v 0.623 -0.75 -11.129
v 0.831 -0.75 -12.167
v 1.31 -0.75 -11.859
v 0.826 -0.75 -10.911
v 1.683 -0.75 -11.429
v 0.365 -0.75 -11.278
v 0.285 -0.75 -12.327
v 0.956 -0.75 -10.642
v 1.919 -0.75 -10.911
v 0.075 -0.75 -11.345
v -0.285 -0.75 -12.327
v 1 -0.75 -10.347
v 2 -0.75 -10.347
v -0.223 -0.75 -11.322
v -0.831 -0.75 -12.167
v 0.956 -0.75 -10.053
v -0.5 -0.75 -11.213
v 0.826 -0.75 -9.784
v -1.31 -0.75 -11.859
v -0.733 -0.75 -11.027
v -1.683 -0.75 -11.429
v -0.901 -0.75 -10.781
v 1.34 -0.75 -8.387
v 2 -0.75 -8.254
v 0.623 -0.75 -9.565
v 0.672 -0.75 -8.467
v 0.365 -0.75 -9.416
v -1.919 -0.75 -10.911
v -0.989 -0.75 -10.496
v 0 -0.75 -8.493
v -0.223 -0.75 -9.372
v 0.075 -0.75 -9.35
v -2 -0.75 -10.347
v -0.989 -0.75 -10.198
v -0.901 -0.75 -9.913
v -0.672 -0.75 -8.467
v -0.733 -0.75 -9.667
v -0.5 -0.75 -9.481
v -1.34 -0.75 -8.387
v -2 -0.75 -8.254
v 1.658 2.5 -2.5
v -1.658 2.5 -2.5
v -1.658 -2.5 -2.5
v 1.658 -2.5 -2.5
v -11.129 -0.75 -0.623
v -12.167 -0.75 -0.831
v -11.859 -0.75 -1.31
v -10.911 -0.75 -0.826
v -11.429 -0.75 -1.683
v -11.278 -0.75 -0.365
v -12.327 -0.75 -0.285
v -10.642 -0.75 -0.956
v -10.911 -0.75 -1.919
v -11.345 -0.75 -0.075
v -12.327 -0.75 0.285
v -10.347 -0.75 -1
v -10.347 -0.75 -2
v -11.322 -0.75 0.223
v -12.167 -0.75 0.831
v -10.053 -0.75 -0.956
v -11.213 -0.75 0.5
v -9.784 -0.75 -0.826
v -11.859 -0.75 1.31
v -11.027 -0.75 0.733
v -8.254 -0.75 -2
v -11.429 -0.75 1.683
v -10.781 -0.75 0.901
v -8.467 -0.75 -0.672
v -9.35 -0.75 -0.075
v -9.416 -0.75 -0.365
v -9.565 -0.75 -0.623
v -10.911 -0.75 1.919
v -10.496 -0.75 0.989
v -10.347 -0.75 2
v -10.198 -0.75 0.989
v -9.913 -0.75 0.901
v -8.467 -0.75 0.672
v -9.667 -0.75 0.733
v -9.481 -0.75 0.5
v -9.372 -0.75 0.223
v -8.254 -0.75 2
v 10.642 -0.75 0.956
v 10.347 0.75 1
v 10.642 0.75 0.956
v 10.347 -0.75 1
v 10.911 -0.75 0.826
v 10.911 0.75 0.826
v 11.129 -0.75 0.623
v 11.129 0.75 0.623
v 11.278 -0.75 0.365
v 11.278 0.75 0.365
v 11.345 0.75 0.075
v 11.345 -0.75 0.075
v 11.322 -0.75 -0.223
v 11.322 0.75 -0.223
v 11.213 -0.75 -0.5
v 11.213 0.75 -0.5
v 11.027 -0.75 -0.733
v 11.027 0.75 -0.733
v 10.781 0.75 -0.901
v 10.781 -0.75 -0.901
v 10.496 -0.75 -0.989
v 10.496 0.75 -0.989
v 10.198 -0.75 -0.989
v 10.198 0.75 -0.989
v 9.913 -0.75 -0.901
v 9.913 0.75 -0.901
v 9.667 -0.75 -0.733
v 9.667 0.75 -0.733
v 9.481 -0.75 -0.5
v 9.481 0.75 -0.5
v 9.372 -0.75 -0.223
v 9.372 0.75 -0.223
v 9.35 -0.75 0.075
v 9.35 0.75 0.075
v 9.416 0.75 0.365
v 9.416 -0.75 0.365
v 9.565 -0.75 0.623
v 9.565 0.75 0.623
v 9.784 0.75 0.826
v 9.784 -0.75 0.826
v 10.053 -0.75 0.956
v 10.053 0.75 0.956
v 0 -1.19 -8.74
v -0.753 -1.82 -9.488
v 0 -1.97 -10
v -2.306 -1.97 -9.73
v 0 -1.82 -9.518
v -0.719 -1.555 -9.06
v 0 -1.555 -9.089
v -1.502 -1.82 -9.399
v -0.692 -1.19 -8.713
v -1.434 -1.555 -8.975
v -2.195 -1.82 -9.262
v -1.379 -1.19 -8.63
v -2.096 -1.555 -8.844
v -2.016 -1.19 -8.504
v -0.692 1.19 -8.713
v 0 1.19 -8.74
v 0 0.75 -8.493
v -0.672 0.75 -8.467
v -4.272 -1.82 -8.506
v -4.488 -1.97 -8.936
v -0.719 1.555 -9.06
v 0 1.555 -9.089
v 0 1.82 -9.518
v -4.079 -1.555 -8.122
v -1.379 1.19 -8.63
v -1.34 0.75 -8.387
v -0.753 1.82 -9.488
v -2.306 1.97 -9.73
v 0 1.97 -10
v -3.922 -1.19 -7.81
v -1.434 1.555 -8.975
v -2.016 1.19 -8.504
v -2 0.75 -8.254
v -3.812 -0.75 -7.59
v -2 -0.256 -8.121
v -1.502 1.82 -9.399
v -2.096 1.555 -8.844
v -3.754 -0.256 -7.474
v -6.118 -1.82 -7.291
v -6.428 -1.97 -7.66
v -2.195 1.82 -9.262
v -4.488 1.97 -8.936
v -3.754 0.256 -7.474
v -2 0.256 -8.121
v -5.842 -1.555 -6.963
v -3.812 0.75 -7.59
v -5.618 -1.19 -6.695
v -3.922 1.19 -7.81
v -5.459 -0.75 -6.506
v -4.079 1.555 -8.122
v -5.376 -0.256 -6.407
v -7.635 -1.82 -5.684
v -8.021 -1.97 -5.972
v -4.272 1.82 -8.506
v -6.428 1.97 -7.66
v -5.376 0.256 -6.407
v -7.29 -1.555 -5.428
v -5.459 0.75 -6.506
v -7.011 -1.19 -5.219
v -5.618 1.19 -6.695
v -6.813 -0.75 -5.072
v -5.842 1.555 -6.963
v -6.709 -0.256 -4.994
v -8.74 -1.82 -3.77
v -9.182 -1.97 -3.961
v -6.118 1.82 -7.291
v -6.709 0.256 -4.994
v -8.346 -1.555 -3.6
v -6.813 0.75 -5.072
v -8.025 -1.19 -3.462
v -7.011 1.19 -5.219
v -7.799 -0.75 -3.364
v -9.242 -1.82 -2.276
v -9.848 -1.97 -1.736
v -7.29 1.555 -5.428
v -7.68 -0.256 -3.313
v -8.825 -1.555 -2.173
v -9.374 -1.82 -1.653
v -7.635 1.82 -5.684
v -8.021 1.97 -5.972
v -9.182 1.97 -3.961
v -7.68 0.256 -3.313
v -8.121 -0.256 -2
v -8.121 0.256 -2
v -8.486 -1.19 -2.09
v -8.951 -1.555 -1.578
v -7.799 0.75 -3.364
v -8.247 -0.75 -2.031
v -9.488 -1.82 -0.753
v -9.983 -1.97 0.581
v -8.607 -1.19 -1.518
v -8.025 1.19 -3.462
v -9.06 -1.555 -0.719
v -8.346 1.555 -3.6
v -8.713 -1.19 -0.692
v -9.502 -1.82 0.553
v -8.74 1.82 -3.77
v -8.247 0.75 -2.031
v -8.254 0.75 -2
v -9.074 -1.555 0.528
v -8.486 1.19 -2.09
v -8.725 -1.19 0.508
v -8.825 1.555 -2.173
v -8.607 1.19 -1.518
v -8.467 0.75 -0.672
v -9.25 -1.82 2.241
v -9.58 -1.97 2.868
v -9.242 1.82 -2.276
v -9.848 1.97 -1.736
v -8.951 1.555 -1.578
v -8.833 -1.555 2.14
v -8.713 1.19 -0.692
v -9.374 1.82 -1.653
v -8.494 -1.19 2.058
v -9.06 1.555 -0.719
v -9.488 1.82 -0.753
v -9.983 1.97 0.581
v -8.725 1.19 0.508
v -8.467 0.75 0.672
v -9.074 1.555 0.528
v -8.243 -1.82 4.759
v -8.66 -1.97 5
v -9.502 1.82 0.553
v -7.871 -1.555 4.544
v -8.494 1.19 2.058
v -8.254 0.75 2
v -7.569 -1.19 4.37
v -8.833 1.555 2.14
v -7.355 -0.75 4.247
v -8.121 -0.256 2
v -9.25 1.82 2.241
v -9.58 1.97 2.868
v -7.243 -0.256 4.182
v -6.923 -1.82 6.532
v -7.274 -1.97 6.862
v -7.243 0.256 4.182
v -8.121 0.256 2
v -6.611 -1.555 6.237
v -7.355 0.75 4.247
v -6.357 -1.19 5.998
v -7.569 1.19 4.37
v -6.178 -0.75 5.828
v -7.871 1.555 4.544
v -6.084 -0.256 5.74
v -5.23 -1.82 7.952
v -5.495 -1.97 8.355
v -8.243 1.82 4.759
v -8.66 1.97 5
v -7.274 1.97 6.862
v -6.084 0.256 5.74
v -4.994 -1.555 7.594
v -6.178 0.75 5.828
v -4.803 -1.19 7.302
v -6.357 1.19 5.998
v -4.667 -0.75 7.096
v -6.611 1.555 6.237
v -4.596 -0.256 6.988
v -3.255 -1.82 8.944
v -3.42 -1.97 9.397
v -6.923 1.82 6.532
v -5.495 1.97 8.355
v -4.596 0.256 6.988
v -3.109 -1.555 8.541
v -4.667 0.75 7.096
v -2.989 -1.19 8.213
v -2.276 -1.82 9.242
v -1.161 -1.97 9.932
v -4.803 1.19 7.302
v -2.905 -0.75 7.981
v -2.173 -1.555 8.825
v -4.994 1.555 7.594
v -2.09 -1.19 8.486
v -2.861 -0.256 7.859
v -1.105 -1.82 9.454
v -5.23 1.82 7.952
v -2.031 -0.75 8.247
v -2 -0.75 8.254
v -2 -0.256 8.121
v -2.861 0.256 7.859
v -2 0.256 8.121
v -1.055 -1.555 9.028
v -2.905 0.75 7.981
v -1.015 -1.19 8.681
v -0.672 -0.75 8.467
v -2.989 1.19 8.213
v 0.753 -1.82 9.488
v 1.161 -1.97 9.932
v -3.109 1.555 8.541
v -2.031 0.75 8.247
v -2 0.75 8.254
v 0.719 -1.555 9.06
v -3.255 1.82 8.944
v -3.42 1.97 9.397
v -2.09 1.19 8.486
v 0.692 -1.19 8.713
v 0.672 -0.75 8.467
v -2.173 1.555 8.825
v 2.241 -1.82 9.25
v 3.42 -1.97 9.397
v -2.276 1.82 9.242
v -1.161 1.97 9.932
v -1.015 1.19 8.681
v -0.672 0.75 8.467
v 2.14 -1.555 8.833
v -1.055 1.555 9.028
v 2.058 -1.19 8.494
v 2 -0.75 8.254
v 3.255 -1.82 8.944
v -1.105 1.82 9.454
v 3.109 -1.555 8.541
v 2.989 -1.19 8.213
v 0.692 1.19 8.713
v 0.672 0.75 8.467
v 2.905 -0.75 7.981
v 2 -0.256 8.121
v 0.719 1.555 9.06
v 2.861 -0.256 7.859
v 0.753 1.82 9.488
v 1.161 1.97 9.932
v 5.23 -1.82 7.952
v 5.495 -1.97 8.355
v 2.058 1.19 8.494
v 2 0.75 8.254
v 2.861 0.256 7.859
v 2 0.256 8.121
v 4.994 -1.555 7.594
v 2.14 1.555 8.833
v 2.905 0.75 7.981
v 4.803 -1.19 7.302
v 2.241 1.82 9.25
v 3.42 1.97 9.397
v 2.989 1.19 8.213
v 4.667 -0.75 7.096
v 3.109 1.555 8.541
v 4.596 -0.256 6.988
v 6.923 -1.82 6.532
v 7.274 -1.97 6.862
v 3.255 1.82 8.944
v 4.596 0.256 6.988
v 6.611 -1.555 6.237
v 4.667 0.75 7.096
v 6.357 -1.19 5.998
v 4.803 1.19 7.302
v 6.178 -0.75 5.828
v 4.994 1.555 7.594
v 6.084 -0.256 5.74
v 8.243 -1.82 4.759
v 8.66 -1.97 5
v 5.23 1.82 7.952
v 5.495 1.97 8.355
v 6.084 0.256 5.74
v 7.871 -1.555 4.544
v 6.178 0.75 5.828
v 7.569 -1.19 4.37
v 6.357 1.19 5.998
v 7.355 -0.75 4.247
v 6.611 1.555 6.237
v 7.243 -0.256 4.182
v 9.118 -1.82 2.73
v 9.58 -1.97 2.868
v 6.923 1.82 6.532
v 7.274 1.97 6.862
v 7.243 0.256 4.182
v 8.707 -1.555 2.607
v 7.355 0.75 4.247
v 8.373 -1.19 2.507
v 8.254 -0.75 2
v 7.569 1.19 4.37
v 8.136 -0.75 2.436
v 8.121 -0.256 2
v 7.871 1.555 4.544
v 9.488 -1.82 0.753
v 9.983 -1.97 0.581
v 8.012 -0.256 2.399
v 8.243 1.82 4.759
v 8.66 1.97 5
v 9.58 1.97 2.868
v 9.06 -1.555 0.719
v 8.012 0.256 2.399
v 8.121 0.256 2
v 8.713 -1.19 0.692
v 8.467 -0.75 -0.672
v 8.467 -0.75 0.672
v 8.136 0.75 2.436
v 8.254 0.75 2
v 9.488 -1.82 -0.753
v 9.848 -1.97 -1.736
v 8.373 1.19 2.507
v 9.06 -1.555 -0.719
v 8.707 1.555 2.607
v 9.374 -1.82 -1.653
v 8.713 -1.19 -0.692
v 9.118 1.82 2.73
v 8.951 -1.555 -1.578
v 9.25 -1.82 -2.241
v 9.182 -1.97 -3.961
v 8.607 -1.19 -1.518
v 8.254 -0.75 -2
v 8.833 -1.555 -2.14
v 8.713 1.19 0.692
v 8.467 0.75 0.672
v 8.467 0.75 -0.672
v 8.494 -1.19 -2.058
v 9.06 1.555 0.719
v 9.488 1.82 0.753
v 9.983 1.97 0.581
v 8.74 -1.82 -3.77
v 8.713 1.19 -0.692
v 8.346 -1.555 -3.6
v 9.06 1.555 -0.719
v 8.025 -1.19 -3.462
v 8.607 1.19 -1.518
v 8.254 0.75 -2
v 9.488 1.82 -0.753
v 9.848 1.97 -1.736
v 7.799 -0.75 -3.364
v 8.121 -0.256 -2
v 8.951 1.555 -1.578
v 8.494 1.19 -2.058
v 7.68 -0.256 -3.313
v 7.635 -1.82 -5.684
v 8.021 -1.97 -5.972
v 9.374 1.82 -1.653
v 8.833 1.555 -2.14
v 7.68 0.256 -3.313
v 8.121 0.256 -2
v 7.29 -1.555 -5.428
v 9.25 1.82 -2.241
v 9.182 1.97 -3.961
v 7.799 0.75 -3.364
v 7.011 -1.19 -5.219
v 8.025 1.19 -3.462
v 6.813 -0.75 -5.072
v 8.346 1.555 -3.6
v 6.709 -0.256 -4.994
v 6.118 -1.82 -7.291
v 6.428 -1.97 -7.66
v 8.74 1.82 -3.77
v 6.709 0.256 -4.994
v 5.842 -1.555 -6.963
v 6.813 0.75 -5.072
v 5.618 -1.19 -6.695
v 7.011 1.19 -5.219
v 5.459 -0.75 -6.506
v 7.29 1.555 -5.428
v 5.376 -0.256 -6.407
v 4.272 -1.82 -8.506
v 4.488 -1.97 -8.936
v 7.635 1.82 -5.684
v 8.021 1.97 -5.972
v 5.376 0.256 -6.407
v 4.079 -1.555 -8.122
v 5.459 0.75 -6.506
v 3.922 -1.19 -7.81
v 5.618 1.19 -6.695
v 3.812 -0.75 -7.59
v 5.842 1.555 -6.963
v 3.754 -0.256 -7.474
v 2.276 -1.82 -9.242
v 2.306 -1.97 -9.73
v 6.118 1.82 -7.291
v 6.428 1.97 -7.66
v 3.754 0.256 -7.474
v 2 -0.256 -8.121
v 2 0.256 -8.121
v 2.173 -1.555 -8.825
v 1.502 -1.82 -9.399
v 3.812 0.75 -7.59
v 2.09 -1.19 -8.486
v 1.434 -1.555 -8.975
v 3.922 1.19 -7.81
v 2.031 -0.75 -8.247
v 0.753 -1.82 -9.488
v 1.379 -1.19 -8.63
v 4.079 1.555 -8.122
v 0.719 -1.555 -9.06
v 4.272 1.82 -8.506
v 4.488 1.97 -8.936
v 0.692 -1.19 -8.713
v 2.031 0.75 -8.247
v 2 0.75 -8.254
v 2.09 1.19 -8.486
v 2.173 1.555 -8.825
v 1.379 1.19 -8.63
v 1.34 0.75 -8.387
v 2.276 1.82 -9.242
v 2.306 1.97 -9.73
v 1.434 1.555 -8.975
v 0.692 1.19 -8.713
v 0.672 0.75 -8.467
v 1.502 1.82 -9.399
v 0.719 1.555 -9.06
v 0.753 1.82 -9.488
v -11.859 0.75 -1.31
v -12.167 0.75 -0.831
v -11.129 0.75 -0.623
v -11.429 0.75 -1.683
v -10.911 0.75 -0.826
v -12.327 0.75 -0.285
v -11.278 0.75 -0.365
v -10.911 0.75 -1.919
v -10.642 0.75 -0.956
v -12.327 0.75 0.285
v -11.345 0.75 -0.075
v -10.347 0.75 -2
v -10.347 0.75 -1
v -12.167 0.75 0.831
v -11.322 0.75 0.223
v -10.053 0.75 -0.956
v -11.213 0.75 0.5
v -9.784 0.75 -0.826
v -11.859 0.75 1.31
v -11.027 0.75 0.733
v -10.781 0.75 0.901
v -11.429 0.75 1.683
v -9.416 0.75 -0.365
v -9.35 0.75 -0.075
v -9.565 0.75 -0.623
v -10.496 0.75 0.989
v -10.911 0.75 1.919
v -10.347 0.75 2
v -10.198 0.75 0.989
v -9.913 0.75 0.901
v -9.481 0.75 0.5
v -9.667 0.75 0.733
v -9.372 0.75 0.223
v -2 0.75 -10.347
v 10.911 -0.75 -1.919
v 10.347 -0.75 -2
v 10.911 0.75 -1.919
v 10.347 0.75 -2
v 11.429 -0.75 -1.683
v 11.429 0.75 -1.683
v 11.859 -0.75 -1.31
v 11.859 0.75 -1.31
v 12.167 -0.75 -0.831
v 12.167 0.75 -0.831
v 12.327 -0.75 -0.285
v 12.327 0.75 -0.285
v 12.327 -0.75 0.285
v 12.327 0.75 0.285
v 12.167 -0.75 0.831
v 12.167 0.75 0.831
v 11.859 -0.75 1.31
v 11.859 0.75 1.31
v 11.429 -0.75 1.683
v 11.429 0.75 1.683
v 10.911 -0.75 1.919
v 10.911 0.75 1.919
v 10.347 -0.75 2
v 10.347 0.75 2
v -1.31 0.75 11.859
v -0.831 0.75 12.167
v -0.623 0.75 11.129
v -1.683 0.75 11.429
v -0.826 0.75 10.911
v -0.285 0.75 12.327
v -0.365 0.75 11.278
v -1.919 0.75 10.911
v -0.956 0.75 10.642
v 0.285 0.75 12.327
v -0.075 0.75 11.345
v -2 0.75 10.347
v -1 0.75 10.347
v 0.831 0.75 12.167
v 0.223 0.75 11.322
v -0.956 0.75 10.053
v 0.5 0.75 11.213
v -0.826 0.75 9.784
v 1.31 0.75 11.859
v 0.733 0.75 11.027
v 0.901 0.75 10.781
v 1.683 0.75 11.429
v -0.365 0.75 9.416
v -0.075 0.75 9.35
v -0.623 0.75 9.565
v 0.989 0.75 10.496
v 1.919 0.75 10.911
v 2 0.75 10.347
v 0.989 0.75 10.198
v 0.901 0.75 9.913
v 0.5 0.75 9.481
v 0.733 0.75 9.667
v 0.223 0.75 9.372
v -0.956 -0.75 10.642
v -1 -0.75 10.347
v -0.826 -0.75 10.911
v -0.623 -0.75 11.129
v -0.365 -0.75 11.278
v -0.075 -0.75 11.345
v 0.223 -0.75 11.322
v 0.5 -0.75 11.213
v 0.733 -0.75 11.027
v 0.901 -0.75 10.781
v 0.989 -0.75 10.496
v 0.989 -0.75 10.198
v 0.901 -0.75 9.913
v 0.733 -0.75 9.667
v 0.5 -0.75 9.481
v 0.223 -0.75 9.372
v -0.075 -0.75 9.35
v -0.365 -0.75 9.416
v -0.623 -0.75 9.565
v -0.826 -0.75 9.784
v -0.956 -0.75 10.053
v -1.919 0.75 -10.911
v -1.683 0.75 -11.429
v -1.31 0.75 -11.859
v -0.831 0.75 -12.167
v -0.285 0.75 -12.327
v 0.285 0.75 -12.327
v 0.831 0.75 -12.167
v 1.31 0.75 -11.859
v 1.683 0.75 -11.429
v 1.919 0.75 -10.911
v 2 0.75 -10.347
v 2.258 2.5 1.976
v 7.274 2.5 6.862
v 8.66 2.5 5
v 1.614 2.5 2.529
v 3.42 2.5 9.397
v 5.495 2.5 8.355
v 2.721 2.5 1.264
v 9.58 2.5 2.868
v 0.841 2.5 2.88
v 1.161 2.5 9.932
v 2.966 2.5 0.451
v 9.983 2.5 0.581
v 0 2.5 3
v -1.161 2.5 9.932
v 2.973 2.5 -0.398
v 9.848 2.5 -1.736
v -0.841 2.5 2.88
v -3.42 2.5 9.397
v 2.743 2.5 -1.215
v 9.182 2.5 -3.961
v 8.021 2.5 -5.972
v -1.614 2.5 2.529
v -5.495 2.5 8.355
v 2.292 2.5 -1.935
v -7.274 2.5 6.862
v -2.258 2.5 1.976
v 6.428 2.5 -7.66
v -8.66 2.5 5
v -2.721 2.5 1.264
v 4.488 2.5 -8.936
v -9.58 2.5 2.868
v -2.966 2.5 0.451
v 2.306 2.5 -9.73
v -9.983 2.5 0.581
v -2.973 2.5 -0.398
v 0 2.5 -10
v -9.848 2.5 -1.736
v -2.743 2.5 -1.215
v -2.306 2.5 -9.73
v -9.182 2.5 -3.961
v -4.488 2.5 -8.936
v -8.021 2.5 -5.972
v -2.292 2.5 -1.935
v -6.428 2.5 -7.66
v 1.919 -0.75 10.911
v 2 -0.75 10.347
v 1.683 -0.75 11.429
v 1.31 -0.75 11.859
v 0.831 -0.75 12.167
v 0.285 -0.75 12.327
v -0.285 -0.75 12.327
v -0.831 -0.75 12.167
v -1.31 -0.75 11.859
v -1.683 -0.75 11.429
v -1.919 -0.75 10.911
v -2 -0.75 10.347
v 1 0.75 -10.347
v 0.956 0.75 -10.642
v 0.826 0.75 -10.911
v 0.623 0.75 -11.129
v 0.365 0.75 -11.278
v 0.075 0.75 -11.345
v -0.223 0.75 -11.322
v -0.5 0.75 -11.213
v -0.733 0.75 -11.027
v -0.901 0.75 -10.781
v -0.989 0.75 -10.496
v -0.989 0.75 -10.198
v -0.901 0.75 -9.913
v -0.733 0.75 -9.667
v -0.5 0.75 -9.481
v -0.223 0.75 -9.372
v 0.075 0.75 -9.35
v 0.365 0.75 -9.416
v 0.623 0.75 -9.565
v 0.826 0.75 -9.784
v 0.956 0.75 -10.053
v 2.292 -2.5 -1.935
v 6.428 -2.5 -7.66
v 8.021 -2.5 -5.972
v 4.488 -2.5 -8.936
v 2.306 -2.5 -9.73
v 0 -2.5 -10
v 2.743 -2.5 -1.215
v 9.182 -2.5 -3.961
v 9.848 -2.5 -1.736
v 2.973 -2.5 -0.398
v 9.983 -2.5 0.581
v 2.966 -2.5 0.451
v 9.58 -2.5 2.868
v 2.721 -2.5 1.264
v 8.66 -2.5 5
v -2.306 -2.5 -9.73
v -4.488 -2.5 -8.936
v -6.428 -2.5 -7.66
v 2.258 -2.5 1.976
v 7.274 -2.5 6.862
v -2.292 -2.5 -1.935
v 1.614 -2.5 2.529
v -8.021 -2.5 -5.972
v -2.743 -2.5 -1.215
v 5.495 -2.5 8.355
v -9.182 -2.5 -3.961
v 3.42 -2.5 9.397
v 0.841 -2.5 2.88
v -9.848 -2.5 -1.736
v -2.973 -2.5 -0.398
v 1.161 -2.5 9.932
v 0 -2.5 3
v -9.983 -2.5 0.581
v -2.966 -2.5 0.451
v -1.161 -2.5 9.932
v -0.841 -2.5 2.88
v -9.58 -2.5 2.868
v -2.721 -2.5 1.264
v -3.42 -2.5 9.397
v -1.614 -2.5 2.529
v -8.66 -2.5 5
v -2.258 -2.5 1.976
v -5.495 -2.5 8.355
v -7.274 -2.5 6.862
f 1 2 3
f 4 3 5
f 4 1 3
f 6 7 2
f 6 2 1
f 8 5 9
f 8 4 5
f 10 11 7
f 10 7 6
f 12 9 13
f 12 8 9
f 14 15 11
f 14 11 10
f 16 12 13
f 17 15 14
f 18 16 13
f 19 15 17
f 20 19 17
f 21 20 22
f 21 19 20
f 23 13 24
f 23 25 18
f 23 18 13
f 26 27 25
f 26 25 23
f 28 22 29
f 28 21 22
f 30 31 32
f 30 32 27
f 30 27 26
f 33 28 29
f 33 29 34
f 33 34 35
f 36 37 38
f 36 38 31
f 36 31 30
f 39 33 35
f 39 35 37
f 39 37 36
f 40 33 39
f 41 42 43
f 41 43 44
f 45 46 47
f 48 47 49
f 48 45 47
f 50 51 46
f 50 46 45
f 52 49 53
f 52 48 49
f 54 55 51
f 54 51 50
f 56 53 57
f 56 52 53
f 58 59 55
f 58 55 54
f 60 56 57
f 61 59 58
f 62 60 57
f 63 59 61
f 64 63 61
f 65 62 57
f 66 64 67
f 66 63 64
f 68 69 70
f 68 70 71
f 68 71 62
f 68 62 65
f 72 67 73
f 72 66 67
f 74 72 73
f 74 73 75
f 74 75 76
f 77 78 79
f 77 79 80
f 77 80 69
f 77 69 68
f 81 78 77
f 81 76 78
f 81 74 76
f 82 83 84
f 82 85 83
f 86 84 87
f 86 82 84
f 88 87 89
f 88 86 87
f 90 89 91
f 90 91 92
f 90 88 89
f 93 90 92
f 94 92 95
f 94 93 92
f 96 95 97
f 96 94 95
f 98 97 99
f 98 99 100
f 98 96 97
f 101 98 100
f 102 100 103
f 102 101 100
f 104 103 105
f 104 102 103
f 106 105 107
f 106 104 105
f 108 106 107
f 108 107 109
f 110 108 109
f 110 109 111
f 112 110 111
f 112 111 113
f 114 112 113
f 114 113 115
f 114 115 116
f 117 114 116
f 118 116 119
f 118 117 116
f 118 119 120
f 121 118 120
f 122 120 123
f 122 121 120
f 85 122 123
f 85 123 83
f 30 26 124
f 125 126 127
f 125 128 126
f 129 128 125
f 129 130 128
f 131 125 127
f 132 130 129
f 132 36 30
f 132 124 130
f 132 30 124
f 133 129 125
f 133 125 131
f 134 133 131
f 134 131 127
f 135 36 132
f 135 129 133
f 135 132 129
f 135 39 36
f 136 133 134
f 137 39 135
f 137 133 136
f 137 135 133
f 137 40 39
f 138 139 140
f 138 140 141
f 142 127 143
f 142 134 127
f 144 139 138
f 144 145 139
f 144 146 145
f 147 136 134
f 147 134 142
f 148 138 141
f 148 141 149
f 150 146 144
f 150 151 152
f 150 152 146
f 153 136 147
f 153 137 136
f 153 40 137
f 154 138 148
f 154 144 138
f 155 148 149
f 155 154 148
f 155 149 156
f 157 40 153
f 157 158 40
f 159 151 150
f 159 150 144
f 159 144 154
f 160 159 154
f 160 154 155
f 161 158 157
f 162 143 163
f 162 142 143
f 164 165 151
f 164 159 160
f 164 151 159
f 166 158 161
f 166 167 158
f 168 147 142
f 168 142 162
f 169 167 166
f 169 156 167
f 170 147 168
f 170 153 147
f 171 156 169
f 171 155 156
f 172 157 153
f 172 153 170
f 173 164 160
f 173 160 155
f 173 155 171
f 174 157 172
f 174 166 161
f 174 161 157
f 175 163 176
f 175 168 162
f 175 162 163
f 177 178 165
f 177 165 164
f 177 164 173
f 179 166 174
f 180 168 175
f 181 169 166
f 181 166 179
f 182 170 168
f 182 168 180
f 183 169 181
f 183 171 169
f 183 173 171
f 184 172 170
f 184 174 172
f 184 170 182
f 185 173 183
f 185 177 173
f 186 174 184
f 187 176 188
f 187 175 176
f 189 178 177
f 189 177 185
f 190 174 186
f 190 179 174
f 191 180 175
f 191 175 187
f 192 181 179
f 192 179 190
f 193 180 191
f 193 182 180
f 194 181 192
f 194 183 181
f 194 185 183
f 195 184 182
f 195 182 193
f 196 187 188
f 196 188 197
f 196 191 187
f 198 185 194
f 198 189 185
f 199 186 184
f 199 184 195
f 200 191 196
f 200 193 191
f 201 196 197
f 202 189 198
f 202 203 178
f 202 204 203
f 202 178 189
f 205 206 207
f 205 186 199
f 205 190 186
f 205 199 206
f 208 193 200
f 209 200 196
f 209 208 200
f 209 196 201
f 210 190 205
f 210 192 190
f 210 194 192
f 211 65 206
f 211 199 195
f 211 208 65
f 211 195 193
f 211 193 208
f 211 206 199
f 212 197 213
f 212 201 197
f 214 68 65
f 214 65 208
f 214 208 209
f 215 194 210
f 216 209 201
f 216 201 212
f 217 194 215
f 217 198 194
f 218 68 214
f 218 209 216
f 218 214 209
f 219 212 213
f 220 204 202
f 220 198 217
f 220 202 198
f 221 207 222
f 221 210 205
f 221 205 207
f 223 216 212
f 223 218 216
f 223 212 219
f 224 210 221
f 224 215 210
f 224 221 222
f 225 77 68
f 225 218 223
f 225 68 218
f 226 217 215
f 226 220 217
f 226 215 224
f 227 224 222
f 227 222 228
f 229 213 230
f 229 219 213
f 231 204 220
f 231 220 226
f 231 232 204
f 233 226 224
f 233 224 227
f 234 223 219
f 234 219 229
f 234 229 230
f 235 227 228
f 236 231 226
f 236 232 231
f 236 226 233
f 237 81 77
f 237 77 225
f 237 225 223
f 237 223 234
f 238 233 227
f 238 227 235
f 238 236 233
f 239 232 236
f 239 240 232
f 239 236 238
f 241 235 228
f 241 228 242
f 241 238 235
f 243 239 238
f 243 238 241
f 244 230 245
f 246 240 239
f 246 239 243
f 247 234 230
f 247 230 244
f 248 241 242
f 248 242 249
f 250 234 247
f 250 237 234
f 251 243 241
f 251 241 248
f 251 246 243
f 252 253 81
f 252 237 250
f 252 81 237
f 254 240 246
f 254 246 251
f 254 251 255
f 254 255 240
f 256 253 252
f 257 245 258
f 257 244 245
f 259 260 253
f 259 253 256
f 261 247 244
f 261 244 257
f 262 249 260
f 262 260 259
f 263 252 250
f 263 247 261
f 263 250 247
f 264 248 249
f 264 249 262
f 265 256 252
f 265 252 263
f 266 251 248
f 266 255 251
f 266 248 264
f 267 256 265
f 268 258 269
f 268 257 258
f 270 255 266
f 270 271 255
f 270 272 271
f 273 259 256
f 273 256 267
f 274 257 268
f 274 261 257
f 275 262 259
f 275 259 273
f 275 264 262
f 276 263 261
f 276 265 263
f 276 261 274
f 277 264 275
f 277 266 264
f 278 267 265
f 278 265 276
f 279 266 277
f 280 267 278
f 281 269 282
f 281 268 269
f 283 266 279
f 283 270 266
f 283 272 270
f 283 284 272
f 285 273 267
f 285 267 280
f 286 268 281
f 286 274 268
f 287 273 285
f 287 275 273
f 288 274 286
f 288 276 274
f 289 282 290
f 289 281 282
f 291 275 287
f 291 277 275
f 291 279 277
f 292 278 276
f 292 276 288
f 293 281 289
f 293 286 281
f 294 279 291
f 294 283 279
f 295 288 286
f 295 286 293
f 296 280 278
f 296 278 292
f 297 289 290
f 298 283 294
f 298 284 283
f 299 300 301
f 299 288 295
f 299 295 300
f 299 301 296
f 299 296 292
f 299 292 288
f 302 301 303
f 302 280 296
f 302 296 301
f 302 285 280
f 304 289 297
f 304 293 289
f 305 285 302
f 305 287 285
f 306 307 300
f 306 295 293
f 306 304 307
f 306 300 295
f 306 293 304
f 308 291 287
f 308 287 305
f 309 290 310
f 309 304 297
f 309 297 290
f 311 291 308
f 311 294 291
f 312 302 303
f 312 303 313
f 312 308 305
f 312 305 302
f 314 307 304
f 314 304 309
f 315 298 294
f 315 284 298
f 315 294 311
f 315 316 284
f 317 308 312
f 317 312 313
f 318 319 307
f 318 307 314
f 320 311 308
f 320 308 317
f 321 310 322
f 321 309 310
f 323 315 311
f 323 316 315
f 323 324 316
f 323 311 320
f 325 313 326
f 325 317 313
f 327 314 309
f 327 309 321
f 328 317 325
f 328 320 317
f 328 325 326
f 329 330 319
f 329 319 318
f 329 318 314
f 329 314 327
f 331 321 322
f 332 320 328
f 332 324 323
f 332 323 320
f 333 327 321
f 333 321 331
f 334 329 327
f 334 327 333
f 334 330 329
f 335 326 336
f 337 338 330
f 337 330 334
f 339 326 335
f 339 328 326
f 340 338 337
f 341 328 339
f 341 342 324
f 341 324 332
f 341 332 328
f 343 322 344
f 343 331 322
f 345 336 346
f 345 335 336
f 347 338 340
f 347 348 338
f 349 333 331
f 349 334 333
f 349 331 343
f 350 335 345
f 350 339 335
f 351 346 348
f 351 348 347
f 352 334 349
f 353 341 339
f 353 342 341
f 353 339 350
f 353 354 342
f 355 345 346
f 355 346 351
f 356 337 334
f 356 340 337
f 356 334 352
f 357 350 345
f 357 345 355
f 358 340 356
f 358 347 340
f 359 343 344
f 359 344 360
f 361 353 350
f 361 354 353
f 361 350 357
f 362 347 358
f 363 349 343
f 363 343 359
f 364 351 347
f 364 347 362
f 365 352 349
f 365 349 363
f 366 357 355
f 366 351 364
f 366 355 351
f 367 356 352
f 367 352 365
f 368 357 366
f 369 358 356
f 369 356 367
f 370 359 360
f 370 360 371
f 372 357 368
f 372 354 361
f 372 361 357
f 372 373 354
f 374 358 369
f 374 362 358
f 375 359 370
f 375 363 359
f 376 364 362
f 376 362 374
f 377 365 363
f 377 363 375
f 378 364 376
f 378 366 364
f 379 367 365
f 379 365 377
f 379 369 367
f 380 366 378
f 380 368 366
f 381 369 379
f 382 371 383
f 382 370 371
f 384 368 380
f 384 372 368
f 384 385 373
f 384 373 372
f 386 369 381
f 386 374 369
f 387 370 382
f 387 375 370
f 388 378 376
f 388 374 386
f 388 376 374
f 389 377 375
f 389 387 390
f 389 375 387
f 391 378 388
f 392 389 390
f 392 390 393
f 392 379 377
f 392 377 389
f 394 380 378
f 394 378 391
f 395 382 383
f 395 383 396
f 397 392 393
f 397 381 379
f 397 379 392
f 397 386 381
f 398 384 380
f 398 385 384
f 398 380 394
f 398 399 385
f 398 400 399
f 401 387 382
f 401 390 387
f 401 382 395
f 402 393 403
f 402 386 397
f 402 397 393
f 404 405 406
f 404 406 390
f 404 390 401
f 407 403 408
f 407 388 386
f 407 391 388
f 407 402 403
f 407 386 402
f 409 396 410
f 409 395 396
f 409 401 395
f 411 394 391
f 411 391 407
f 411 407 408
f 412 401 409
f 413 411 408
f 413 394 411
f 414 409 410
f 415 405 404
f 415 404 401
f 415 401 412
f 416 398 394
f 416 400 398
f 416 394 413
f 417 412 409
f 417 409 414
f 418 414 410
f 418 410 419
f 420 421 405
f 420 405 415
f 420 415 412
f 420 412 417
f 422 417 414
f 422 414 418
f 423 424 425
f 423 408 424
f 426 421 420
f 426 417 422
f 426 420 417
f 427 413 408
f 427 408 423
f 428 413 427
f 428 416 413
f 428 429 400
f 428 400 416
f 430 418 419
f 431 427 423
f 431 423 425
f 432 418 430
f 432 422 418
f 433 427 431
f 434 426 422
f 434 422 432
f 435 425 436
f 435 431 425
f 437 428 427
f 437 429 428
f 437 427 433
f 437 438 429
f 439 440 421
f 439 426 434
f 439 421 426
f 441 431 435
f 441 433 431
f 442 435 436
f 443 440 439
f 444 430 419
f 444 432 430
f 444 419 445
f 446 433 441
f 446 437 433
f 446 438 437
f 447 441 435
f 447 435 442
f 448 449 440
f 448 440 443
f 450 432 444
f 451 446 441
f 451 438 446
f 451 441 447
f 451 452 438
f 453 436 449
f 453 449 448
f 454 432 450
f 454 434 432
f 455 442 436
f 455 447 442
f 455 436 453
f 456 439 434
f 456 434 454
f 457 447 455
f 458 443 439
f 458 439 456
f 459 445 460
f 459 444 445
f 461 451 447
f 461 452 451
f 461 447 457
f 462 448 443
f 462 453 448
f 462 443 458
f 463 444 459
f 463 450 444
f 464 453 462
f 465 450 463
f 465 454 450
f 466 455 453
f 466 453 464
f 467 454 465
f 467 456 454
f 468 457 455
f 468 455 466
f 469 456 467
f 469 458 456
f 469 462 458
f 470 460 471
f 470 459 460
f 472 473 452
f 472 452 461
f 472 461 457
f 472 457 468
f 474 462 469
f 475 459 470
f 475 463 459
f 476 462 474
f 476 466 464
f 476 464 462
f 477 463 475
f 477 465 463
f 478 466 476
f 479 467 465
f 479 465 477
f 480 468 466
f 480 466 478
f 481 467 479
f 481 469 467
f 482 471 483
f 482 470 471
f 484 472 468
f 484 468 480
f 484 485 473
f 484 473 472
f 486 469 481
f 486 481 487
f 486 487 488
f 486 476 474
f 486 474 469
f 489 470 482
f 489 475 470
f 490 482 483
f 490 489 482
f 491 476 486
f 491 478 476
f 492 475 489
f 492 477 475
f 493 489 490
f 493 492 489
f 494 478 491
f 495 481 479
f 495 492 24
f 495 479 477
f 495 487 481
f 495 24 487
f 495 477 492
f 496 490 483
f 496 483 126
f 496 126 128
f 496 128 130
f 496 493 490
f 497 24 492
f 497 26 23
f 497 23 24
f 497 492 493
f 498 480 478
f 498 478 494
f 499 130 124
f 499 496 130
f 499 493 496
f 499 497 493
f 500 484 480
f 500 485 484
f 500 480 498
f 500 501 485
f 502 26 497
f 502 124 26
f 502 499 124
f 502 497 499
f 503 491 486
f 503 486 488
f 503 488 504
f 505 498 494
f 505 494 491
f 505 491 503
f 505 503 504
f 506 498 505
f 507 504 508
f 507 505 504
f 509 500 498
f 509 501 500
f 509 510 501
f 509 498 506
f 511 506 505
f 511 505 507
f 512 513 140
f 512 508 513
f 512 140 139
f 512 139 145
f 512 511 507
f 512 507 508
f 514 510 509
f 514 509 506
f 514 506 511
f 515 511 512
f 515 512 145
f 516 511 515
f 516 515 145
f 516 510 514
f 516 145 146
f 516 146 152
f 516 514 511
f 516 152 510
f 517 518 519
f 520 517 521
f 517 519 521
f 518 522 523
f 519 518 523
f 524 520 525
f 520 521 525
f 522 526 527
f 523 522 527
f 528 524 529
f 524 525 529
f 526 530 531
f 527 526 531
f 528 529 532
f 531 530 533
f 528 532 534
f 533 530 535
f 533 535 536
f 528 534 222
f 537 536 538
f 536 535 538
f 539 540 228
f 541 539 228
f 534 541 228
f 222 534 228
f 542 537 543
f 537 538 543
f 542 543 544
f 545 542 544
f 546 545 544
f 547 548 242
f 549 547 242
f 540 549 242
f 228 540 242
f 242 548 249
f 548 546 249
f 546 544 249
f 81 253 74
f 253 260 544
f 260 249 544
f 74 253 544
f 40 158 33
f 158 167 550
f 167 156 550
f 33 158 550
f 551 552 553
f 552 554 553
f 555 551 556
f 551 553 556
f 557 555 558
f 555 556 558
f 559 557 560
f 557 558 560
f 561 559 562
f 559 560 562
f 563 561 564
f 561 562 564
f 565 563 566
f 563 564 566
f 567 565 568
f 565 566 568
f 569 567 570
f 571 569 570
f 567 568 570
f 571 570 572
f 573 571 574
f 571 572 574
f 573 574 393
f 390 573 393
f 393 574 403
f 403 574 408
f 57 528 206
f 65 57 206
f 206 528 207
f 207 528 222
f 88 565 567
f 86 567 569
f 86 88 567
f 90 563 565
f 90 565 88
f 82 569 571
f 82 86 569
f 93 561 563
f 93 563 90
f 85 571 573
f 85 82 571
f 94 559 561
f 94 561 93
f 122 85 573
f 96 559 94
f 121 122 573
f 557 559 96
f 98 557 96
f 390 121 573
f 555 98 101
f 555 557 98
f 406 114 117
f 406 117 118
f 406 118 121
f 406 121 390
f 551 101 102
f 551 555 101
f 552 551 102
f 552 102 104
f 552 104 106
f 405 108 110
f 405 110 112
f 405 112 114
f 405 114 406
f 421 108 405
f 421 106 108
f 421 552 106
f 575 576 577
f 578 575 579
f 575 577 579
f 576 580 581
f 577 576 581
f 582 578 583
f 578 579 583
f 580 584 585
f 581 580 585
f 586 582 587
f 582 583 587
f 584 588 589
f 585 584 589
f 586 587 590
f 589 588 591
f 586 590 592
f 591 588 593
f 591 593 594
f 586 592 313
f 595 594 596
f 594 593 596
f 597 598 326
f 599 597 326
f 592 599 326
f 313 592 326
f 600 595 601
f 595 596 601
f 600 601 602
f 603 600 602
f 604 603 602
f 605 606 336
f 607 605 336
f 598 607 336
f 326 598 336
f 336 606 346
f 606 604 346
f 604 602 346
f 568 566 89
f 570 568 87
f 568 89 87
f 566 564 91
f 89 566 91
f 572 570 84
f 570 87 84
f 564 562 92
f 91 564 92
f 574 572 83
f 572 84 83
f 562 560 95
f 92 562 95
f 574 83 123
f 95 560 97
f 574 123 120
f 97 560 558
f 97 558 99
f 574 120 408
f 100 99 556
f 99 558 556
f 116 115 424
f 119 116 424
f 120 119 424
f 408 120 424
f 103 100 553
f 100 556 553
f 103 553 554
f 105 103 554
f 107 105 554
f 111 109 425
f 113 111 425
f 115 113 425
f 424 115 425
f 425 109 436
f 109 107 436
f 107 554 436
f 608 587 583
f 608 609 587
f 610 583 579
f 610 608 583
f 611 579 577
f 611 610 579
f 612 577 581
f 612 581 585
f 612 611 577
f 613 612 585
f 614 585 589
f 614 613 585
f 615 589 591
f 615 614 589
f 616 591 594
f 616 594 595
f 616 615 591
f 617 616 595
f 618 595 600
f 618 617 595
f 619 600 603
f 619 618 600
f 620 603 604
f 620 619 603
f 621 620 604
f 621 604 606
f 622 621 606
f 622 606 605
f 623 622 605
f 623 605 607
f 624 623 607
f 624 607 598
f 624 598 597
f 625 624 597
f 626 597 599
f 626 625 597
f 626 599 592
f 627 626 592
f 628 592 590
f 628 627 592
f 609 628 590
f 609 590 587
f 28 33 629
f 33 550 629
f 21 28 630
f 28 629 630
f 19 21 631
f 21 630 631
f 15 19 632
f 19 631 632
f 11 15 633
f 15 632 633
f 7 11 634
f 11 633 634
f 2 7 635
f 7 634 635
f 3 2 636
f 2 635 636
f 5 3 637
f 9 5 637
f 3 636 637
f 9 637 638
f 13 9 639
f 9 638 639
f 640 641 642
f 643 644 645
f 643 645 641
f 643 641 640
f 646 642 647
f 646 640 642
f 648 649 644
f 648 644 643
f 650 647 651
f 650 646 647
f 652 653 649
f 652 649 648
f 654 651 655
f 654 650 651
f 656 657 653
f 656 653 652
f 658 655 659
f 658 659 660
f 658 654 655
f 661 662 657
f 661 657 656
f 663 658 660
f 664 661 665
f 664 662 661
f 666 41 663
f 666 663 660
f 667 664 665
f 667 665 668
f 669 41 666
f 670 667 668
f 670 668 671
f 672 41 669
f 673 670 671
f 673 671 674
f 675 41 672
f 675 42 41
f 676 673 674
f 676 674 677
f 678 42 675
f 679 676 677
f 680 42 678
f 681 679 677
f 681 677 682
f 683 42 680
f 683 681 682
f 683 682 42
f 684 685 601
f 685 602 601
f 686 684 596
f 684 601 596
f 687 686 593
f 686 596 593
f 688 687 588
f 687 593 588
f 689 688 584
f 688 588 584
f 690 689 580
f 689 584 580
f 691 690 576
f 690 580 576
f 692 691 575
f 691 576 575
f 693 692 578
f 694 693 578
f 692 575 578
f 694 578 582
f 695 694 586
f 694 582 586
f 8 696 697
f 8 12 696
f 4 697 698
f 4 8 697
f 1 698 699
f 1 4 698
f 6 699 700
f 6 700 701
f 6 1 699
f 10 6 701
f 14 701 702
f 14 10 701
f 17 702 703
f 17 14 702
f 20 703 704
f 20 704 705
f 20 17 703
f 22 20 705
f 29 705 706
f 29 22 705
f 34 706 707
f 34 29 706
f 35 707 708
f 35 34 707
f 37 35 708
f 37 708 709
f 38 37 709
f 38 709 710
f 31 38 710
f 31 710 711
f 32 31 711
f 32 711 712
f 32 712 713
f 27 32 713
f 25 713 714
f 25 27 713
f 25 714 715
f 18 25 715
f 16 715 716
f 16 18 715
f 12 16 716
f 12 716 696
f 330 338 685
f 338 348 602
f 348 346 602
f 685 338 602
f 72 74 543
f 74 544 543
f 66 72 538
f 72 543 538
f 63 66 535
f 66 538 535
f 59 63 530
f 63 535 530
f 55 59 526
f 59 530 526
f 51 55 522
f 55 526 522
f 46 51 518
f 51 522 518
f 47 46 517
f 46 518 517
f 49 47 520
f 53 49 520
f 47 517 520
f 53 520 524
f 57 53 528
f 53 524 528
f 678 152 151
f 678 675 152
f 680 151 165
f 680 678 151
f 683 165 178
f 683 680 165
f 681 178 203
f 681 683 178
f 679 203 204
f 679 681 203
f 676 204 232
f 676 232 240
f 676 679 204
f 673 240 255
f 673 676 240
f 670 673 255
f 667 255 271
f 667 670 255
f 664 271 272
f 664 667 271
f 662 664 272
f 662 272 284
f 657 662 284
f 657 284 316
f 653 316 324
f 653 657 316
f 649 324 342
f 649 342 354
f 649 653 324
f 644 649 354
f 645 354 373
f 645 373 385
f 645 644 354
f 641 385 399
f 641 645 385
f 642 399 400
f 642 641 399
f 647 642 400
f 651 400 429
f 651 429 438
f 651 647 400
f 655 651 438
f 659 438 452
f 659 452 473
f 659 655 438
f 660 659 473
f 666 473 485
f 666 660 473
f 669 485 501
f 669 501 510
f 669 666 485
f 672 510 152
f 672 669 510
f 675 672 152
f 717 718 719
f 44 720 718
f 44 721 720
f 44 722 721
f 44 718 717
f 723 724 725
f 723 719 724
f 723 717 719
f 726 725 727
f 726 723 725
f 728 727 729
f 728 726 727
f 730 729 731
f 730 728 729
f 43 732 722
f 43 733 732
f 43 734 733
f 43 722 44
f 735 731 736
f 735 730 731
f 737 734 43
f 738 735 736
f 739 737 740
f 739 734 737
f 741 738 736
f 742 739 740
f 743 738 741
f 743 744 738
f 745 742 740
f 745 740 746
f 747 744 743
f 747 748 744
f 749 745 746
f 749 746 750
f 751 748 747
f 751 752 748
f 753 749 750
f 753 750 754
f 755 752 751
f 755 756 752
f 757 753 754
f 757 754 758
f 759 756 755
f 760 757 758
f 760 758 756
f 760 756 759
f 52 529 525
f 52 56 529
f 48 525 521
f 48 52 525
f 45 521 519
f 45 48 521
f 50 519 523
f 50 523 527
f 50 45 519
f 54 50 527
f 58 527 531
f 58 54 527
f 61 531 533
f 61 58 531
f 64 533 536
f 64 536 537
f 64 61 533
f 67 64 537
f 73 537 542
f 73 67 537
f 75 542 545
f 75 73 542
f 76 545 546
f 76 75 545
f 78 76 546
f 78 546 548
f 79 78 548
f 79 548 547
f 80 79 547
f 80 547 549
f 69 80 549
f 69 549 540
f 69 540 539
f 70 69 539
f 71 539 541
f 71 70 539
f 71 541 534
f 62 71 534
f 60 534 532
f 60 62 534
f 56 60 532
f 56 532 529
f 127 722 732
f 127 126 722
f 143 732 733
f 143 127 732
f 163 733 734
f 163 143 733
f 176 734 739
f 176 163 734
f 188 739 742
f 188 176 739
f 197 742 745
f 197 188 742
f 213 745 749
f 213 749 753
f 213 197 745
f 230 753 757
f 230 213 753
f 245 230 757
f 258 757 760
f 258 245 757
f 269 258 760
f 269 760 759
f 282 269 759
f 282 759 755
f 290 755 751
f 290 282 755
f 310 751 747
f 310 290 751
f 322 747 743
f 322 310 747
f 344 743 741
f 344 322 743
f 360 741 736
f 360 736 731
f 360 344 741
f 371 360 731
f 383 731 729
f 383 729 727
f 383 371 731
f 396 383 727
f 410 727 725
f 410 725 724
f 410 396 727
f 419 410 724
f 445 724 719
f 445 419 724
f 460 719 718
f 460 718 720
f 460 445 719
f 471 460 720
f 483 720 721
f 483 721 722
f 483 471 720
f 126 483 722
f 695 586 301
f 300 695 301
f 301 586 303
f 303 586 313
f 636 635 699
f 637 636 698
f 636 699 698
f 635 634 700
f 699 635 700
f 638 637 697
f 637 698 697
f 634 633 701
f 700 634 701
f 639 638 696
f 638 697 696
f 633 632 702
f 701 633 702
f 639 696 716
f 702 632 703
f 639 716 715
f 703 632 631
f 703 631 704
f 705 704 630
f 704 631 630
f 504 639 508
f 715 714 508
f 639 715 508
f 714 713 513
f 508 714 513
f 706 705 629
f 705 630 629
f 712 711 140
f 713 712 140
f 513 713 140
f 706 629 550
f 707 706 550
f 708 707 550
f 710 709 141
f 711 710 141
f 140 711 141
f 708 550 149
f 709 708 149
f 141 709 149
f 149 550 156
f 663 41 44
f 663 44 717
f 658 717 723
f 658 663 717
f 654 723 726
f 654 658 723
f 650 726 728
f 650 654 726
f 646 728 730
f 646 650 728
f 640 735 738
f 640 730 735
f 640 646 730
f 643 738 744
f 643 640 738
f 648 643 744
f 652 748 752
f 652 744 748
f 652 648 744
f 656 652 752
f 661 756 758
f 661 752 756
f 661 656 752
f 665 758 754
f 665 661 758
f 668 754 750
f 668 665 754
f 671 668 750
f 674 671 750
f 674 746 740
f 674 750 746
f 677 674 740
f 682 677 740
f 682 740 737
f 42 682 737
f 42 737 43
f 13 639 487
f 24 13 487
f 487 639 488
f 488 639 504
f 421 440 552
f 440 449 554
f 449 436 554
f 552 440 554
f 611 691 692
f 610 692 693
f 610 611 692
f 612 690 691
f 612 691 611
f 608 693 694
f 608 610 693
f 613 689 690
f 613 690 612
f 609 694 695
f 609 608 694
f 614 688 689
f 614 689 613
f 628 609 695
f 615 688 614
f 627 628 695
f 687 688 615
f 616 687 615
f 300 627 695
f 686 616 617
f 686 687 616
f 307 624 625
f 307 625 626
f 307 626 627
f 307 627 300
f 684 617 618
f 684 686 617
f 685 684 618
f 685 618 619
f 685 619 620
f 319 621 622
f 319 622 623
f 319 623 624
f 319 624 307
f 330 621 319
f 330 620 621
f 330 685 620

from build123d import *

# Parameters (mm, degrees)
CUT_EXTRUDE1_DEPTH  = 16
SKETCH4_R           = 1
BOSS_EXTRUDE1_DEPTH = 0.75
CIRPATTERN1_COUNT   = 4


with BuildPart() as part:
    # Sketch2 → Revolve1 (revolve)
    with BuildSketch(Plane.XY, mode=Mode.PRIVATE) as revolve1_sk:
        with BuildLine():
            Line((0, 2.5), (0, -2.5))
            Line((0, -2.5), (10, -2.5))
            Line((10, -2.5), (10, -1.969615506))
            ThreePointArc((10, -1.969615506), (8.347296355, 0), (10, 1.969615506))
            Line((10, 1.969615506), (10, 2.5))
            Line((10, 2.5), (0, 2.5))
        make_face()
    revolve(revolve1_sk.sketch.rotate(Axis((0, 0, 0), (0, 1, 0)), 90), axis=Axis((0, 0, 0), (0, 1, 0)))

    # Sketch3 → Cut-Extrude1 (cut, through all)
    with BuildSketch(Plane(origin=(0, 2.5, 0), x_dir=(1, 0, 0), z_dir=(0, 1, 0))):
        with BuildLine():
            Line((-1.658312395, 2.5), (1.658312395, 2.5))
            ThreePointArc((1.658312395, 2.5), (0, -3), (-1.658312395, 2.5))
        make_face()
    extrude(amount=-CUT_EXTRUDE1_DEPTH, mode=Mode.SUBTRACT)

    # Sketch4 → Boss-Extrude1 (add, symmetric)
    with BuildSketch(Plane(origin=(0, 0, 0), x_dir=(1, 0, 0), z_dir=(0, 1, 0))):
        with BuildLine():
            Line((5.347296355, 2), (10.347296355, 2))
            ThreePointArc((10.347296355, 2), (12.347296355, 0), (10.347296355, -2))
            Line((10.347296355, -2), (5.347296355, -2))
            Line((5.347296355, -2), (5.347296355, 2))
        make_face()
        with Locations(Location((10.347296355, 0, 0), (0, 0, 270))):
            Circle(SKETCH4_R, mode=Mode.SUBTRACT)
    boss_extrude1 = extrude(amount=BOSS_EXTRUDE1_DEPTH, both=True)

    # CirPattern1: Boss-Extrude1 ×4 about axis
    cirpattern1_axis = Axis((0, 0, 0), (0, 1, 0))
    for i in range(1, CIRPATTERN1_COUNT):
        add(boss_extrude1.rotate(cirpattern1_axis, i * 360 / CIRPATTERN1_COUNT))


solid = part.part
